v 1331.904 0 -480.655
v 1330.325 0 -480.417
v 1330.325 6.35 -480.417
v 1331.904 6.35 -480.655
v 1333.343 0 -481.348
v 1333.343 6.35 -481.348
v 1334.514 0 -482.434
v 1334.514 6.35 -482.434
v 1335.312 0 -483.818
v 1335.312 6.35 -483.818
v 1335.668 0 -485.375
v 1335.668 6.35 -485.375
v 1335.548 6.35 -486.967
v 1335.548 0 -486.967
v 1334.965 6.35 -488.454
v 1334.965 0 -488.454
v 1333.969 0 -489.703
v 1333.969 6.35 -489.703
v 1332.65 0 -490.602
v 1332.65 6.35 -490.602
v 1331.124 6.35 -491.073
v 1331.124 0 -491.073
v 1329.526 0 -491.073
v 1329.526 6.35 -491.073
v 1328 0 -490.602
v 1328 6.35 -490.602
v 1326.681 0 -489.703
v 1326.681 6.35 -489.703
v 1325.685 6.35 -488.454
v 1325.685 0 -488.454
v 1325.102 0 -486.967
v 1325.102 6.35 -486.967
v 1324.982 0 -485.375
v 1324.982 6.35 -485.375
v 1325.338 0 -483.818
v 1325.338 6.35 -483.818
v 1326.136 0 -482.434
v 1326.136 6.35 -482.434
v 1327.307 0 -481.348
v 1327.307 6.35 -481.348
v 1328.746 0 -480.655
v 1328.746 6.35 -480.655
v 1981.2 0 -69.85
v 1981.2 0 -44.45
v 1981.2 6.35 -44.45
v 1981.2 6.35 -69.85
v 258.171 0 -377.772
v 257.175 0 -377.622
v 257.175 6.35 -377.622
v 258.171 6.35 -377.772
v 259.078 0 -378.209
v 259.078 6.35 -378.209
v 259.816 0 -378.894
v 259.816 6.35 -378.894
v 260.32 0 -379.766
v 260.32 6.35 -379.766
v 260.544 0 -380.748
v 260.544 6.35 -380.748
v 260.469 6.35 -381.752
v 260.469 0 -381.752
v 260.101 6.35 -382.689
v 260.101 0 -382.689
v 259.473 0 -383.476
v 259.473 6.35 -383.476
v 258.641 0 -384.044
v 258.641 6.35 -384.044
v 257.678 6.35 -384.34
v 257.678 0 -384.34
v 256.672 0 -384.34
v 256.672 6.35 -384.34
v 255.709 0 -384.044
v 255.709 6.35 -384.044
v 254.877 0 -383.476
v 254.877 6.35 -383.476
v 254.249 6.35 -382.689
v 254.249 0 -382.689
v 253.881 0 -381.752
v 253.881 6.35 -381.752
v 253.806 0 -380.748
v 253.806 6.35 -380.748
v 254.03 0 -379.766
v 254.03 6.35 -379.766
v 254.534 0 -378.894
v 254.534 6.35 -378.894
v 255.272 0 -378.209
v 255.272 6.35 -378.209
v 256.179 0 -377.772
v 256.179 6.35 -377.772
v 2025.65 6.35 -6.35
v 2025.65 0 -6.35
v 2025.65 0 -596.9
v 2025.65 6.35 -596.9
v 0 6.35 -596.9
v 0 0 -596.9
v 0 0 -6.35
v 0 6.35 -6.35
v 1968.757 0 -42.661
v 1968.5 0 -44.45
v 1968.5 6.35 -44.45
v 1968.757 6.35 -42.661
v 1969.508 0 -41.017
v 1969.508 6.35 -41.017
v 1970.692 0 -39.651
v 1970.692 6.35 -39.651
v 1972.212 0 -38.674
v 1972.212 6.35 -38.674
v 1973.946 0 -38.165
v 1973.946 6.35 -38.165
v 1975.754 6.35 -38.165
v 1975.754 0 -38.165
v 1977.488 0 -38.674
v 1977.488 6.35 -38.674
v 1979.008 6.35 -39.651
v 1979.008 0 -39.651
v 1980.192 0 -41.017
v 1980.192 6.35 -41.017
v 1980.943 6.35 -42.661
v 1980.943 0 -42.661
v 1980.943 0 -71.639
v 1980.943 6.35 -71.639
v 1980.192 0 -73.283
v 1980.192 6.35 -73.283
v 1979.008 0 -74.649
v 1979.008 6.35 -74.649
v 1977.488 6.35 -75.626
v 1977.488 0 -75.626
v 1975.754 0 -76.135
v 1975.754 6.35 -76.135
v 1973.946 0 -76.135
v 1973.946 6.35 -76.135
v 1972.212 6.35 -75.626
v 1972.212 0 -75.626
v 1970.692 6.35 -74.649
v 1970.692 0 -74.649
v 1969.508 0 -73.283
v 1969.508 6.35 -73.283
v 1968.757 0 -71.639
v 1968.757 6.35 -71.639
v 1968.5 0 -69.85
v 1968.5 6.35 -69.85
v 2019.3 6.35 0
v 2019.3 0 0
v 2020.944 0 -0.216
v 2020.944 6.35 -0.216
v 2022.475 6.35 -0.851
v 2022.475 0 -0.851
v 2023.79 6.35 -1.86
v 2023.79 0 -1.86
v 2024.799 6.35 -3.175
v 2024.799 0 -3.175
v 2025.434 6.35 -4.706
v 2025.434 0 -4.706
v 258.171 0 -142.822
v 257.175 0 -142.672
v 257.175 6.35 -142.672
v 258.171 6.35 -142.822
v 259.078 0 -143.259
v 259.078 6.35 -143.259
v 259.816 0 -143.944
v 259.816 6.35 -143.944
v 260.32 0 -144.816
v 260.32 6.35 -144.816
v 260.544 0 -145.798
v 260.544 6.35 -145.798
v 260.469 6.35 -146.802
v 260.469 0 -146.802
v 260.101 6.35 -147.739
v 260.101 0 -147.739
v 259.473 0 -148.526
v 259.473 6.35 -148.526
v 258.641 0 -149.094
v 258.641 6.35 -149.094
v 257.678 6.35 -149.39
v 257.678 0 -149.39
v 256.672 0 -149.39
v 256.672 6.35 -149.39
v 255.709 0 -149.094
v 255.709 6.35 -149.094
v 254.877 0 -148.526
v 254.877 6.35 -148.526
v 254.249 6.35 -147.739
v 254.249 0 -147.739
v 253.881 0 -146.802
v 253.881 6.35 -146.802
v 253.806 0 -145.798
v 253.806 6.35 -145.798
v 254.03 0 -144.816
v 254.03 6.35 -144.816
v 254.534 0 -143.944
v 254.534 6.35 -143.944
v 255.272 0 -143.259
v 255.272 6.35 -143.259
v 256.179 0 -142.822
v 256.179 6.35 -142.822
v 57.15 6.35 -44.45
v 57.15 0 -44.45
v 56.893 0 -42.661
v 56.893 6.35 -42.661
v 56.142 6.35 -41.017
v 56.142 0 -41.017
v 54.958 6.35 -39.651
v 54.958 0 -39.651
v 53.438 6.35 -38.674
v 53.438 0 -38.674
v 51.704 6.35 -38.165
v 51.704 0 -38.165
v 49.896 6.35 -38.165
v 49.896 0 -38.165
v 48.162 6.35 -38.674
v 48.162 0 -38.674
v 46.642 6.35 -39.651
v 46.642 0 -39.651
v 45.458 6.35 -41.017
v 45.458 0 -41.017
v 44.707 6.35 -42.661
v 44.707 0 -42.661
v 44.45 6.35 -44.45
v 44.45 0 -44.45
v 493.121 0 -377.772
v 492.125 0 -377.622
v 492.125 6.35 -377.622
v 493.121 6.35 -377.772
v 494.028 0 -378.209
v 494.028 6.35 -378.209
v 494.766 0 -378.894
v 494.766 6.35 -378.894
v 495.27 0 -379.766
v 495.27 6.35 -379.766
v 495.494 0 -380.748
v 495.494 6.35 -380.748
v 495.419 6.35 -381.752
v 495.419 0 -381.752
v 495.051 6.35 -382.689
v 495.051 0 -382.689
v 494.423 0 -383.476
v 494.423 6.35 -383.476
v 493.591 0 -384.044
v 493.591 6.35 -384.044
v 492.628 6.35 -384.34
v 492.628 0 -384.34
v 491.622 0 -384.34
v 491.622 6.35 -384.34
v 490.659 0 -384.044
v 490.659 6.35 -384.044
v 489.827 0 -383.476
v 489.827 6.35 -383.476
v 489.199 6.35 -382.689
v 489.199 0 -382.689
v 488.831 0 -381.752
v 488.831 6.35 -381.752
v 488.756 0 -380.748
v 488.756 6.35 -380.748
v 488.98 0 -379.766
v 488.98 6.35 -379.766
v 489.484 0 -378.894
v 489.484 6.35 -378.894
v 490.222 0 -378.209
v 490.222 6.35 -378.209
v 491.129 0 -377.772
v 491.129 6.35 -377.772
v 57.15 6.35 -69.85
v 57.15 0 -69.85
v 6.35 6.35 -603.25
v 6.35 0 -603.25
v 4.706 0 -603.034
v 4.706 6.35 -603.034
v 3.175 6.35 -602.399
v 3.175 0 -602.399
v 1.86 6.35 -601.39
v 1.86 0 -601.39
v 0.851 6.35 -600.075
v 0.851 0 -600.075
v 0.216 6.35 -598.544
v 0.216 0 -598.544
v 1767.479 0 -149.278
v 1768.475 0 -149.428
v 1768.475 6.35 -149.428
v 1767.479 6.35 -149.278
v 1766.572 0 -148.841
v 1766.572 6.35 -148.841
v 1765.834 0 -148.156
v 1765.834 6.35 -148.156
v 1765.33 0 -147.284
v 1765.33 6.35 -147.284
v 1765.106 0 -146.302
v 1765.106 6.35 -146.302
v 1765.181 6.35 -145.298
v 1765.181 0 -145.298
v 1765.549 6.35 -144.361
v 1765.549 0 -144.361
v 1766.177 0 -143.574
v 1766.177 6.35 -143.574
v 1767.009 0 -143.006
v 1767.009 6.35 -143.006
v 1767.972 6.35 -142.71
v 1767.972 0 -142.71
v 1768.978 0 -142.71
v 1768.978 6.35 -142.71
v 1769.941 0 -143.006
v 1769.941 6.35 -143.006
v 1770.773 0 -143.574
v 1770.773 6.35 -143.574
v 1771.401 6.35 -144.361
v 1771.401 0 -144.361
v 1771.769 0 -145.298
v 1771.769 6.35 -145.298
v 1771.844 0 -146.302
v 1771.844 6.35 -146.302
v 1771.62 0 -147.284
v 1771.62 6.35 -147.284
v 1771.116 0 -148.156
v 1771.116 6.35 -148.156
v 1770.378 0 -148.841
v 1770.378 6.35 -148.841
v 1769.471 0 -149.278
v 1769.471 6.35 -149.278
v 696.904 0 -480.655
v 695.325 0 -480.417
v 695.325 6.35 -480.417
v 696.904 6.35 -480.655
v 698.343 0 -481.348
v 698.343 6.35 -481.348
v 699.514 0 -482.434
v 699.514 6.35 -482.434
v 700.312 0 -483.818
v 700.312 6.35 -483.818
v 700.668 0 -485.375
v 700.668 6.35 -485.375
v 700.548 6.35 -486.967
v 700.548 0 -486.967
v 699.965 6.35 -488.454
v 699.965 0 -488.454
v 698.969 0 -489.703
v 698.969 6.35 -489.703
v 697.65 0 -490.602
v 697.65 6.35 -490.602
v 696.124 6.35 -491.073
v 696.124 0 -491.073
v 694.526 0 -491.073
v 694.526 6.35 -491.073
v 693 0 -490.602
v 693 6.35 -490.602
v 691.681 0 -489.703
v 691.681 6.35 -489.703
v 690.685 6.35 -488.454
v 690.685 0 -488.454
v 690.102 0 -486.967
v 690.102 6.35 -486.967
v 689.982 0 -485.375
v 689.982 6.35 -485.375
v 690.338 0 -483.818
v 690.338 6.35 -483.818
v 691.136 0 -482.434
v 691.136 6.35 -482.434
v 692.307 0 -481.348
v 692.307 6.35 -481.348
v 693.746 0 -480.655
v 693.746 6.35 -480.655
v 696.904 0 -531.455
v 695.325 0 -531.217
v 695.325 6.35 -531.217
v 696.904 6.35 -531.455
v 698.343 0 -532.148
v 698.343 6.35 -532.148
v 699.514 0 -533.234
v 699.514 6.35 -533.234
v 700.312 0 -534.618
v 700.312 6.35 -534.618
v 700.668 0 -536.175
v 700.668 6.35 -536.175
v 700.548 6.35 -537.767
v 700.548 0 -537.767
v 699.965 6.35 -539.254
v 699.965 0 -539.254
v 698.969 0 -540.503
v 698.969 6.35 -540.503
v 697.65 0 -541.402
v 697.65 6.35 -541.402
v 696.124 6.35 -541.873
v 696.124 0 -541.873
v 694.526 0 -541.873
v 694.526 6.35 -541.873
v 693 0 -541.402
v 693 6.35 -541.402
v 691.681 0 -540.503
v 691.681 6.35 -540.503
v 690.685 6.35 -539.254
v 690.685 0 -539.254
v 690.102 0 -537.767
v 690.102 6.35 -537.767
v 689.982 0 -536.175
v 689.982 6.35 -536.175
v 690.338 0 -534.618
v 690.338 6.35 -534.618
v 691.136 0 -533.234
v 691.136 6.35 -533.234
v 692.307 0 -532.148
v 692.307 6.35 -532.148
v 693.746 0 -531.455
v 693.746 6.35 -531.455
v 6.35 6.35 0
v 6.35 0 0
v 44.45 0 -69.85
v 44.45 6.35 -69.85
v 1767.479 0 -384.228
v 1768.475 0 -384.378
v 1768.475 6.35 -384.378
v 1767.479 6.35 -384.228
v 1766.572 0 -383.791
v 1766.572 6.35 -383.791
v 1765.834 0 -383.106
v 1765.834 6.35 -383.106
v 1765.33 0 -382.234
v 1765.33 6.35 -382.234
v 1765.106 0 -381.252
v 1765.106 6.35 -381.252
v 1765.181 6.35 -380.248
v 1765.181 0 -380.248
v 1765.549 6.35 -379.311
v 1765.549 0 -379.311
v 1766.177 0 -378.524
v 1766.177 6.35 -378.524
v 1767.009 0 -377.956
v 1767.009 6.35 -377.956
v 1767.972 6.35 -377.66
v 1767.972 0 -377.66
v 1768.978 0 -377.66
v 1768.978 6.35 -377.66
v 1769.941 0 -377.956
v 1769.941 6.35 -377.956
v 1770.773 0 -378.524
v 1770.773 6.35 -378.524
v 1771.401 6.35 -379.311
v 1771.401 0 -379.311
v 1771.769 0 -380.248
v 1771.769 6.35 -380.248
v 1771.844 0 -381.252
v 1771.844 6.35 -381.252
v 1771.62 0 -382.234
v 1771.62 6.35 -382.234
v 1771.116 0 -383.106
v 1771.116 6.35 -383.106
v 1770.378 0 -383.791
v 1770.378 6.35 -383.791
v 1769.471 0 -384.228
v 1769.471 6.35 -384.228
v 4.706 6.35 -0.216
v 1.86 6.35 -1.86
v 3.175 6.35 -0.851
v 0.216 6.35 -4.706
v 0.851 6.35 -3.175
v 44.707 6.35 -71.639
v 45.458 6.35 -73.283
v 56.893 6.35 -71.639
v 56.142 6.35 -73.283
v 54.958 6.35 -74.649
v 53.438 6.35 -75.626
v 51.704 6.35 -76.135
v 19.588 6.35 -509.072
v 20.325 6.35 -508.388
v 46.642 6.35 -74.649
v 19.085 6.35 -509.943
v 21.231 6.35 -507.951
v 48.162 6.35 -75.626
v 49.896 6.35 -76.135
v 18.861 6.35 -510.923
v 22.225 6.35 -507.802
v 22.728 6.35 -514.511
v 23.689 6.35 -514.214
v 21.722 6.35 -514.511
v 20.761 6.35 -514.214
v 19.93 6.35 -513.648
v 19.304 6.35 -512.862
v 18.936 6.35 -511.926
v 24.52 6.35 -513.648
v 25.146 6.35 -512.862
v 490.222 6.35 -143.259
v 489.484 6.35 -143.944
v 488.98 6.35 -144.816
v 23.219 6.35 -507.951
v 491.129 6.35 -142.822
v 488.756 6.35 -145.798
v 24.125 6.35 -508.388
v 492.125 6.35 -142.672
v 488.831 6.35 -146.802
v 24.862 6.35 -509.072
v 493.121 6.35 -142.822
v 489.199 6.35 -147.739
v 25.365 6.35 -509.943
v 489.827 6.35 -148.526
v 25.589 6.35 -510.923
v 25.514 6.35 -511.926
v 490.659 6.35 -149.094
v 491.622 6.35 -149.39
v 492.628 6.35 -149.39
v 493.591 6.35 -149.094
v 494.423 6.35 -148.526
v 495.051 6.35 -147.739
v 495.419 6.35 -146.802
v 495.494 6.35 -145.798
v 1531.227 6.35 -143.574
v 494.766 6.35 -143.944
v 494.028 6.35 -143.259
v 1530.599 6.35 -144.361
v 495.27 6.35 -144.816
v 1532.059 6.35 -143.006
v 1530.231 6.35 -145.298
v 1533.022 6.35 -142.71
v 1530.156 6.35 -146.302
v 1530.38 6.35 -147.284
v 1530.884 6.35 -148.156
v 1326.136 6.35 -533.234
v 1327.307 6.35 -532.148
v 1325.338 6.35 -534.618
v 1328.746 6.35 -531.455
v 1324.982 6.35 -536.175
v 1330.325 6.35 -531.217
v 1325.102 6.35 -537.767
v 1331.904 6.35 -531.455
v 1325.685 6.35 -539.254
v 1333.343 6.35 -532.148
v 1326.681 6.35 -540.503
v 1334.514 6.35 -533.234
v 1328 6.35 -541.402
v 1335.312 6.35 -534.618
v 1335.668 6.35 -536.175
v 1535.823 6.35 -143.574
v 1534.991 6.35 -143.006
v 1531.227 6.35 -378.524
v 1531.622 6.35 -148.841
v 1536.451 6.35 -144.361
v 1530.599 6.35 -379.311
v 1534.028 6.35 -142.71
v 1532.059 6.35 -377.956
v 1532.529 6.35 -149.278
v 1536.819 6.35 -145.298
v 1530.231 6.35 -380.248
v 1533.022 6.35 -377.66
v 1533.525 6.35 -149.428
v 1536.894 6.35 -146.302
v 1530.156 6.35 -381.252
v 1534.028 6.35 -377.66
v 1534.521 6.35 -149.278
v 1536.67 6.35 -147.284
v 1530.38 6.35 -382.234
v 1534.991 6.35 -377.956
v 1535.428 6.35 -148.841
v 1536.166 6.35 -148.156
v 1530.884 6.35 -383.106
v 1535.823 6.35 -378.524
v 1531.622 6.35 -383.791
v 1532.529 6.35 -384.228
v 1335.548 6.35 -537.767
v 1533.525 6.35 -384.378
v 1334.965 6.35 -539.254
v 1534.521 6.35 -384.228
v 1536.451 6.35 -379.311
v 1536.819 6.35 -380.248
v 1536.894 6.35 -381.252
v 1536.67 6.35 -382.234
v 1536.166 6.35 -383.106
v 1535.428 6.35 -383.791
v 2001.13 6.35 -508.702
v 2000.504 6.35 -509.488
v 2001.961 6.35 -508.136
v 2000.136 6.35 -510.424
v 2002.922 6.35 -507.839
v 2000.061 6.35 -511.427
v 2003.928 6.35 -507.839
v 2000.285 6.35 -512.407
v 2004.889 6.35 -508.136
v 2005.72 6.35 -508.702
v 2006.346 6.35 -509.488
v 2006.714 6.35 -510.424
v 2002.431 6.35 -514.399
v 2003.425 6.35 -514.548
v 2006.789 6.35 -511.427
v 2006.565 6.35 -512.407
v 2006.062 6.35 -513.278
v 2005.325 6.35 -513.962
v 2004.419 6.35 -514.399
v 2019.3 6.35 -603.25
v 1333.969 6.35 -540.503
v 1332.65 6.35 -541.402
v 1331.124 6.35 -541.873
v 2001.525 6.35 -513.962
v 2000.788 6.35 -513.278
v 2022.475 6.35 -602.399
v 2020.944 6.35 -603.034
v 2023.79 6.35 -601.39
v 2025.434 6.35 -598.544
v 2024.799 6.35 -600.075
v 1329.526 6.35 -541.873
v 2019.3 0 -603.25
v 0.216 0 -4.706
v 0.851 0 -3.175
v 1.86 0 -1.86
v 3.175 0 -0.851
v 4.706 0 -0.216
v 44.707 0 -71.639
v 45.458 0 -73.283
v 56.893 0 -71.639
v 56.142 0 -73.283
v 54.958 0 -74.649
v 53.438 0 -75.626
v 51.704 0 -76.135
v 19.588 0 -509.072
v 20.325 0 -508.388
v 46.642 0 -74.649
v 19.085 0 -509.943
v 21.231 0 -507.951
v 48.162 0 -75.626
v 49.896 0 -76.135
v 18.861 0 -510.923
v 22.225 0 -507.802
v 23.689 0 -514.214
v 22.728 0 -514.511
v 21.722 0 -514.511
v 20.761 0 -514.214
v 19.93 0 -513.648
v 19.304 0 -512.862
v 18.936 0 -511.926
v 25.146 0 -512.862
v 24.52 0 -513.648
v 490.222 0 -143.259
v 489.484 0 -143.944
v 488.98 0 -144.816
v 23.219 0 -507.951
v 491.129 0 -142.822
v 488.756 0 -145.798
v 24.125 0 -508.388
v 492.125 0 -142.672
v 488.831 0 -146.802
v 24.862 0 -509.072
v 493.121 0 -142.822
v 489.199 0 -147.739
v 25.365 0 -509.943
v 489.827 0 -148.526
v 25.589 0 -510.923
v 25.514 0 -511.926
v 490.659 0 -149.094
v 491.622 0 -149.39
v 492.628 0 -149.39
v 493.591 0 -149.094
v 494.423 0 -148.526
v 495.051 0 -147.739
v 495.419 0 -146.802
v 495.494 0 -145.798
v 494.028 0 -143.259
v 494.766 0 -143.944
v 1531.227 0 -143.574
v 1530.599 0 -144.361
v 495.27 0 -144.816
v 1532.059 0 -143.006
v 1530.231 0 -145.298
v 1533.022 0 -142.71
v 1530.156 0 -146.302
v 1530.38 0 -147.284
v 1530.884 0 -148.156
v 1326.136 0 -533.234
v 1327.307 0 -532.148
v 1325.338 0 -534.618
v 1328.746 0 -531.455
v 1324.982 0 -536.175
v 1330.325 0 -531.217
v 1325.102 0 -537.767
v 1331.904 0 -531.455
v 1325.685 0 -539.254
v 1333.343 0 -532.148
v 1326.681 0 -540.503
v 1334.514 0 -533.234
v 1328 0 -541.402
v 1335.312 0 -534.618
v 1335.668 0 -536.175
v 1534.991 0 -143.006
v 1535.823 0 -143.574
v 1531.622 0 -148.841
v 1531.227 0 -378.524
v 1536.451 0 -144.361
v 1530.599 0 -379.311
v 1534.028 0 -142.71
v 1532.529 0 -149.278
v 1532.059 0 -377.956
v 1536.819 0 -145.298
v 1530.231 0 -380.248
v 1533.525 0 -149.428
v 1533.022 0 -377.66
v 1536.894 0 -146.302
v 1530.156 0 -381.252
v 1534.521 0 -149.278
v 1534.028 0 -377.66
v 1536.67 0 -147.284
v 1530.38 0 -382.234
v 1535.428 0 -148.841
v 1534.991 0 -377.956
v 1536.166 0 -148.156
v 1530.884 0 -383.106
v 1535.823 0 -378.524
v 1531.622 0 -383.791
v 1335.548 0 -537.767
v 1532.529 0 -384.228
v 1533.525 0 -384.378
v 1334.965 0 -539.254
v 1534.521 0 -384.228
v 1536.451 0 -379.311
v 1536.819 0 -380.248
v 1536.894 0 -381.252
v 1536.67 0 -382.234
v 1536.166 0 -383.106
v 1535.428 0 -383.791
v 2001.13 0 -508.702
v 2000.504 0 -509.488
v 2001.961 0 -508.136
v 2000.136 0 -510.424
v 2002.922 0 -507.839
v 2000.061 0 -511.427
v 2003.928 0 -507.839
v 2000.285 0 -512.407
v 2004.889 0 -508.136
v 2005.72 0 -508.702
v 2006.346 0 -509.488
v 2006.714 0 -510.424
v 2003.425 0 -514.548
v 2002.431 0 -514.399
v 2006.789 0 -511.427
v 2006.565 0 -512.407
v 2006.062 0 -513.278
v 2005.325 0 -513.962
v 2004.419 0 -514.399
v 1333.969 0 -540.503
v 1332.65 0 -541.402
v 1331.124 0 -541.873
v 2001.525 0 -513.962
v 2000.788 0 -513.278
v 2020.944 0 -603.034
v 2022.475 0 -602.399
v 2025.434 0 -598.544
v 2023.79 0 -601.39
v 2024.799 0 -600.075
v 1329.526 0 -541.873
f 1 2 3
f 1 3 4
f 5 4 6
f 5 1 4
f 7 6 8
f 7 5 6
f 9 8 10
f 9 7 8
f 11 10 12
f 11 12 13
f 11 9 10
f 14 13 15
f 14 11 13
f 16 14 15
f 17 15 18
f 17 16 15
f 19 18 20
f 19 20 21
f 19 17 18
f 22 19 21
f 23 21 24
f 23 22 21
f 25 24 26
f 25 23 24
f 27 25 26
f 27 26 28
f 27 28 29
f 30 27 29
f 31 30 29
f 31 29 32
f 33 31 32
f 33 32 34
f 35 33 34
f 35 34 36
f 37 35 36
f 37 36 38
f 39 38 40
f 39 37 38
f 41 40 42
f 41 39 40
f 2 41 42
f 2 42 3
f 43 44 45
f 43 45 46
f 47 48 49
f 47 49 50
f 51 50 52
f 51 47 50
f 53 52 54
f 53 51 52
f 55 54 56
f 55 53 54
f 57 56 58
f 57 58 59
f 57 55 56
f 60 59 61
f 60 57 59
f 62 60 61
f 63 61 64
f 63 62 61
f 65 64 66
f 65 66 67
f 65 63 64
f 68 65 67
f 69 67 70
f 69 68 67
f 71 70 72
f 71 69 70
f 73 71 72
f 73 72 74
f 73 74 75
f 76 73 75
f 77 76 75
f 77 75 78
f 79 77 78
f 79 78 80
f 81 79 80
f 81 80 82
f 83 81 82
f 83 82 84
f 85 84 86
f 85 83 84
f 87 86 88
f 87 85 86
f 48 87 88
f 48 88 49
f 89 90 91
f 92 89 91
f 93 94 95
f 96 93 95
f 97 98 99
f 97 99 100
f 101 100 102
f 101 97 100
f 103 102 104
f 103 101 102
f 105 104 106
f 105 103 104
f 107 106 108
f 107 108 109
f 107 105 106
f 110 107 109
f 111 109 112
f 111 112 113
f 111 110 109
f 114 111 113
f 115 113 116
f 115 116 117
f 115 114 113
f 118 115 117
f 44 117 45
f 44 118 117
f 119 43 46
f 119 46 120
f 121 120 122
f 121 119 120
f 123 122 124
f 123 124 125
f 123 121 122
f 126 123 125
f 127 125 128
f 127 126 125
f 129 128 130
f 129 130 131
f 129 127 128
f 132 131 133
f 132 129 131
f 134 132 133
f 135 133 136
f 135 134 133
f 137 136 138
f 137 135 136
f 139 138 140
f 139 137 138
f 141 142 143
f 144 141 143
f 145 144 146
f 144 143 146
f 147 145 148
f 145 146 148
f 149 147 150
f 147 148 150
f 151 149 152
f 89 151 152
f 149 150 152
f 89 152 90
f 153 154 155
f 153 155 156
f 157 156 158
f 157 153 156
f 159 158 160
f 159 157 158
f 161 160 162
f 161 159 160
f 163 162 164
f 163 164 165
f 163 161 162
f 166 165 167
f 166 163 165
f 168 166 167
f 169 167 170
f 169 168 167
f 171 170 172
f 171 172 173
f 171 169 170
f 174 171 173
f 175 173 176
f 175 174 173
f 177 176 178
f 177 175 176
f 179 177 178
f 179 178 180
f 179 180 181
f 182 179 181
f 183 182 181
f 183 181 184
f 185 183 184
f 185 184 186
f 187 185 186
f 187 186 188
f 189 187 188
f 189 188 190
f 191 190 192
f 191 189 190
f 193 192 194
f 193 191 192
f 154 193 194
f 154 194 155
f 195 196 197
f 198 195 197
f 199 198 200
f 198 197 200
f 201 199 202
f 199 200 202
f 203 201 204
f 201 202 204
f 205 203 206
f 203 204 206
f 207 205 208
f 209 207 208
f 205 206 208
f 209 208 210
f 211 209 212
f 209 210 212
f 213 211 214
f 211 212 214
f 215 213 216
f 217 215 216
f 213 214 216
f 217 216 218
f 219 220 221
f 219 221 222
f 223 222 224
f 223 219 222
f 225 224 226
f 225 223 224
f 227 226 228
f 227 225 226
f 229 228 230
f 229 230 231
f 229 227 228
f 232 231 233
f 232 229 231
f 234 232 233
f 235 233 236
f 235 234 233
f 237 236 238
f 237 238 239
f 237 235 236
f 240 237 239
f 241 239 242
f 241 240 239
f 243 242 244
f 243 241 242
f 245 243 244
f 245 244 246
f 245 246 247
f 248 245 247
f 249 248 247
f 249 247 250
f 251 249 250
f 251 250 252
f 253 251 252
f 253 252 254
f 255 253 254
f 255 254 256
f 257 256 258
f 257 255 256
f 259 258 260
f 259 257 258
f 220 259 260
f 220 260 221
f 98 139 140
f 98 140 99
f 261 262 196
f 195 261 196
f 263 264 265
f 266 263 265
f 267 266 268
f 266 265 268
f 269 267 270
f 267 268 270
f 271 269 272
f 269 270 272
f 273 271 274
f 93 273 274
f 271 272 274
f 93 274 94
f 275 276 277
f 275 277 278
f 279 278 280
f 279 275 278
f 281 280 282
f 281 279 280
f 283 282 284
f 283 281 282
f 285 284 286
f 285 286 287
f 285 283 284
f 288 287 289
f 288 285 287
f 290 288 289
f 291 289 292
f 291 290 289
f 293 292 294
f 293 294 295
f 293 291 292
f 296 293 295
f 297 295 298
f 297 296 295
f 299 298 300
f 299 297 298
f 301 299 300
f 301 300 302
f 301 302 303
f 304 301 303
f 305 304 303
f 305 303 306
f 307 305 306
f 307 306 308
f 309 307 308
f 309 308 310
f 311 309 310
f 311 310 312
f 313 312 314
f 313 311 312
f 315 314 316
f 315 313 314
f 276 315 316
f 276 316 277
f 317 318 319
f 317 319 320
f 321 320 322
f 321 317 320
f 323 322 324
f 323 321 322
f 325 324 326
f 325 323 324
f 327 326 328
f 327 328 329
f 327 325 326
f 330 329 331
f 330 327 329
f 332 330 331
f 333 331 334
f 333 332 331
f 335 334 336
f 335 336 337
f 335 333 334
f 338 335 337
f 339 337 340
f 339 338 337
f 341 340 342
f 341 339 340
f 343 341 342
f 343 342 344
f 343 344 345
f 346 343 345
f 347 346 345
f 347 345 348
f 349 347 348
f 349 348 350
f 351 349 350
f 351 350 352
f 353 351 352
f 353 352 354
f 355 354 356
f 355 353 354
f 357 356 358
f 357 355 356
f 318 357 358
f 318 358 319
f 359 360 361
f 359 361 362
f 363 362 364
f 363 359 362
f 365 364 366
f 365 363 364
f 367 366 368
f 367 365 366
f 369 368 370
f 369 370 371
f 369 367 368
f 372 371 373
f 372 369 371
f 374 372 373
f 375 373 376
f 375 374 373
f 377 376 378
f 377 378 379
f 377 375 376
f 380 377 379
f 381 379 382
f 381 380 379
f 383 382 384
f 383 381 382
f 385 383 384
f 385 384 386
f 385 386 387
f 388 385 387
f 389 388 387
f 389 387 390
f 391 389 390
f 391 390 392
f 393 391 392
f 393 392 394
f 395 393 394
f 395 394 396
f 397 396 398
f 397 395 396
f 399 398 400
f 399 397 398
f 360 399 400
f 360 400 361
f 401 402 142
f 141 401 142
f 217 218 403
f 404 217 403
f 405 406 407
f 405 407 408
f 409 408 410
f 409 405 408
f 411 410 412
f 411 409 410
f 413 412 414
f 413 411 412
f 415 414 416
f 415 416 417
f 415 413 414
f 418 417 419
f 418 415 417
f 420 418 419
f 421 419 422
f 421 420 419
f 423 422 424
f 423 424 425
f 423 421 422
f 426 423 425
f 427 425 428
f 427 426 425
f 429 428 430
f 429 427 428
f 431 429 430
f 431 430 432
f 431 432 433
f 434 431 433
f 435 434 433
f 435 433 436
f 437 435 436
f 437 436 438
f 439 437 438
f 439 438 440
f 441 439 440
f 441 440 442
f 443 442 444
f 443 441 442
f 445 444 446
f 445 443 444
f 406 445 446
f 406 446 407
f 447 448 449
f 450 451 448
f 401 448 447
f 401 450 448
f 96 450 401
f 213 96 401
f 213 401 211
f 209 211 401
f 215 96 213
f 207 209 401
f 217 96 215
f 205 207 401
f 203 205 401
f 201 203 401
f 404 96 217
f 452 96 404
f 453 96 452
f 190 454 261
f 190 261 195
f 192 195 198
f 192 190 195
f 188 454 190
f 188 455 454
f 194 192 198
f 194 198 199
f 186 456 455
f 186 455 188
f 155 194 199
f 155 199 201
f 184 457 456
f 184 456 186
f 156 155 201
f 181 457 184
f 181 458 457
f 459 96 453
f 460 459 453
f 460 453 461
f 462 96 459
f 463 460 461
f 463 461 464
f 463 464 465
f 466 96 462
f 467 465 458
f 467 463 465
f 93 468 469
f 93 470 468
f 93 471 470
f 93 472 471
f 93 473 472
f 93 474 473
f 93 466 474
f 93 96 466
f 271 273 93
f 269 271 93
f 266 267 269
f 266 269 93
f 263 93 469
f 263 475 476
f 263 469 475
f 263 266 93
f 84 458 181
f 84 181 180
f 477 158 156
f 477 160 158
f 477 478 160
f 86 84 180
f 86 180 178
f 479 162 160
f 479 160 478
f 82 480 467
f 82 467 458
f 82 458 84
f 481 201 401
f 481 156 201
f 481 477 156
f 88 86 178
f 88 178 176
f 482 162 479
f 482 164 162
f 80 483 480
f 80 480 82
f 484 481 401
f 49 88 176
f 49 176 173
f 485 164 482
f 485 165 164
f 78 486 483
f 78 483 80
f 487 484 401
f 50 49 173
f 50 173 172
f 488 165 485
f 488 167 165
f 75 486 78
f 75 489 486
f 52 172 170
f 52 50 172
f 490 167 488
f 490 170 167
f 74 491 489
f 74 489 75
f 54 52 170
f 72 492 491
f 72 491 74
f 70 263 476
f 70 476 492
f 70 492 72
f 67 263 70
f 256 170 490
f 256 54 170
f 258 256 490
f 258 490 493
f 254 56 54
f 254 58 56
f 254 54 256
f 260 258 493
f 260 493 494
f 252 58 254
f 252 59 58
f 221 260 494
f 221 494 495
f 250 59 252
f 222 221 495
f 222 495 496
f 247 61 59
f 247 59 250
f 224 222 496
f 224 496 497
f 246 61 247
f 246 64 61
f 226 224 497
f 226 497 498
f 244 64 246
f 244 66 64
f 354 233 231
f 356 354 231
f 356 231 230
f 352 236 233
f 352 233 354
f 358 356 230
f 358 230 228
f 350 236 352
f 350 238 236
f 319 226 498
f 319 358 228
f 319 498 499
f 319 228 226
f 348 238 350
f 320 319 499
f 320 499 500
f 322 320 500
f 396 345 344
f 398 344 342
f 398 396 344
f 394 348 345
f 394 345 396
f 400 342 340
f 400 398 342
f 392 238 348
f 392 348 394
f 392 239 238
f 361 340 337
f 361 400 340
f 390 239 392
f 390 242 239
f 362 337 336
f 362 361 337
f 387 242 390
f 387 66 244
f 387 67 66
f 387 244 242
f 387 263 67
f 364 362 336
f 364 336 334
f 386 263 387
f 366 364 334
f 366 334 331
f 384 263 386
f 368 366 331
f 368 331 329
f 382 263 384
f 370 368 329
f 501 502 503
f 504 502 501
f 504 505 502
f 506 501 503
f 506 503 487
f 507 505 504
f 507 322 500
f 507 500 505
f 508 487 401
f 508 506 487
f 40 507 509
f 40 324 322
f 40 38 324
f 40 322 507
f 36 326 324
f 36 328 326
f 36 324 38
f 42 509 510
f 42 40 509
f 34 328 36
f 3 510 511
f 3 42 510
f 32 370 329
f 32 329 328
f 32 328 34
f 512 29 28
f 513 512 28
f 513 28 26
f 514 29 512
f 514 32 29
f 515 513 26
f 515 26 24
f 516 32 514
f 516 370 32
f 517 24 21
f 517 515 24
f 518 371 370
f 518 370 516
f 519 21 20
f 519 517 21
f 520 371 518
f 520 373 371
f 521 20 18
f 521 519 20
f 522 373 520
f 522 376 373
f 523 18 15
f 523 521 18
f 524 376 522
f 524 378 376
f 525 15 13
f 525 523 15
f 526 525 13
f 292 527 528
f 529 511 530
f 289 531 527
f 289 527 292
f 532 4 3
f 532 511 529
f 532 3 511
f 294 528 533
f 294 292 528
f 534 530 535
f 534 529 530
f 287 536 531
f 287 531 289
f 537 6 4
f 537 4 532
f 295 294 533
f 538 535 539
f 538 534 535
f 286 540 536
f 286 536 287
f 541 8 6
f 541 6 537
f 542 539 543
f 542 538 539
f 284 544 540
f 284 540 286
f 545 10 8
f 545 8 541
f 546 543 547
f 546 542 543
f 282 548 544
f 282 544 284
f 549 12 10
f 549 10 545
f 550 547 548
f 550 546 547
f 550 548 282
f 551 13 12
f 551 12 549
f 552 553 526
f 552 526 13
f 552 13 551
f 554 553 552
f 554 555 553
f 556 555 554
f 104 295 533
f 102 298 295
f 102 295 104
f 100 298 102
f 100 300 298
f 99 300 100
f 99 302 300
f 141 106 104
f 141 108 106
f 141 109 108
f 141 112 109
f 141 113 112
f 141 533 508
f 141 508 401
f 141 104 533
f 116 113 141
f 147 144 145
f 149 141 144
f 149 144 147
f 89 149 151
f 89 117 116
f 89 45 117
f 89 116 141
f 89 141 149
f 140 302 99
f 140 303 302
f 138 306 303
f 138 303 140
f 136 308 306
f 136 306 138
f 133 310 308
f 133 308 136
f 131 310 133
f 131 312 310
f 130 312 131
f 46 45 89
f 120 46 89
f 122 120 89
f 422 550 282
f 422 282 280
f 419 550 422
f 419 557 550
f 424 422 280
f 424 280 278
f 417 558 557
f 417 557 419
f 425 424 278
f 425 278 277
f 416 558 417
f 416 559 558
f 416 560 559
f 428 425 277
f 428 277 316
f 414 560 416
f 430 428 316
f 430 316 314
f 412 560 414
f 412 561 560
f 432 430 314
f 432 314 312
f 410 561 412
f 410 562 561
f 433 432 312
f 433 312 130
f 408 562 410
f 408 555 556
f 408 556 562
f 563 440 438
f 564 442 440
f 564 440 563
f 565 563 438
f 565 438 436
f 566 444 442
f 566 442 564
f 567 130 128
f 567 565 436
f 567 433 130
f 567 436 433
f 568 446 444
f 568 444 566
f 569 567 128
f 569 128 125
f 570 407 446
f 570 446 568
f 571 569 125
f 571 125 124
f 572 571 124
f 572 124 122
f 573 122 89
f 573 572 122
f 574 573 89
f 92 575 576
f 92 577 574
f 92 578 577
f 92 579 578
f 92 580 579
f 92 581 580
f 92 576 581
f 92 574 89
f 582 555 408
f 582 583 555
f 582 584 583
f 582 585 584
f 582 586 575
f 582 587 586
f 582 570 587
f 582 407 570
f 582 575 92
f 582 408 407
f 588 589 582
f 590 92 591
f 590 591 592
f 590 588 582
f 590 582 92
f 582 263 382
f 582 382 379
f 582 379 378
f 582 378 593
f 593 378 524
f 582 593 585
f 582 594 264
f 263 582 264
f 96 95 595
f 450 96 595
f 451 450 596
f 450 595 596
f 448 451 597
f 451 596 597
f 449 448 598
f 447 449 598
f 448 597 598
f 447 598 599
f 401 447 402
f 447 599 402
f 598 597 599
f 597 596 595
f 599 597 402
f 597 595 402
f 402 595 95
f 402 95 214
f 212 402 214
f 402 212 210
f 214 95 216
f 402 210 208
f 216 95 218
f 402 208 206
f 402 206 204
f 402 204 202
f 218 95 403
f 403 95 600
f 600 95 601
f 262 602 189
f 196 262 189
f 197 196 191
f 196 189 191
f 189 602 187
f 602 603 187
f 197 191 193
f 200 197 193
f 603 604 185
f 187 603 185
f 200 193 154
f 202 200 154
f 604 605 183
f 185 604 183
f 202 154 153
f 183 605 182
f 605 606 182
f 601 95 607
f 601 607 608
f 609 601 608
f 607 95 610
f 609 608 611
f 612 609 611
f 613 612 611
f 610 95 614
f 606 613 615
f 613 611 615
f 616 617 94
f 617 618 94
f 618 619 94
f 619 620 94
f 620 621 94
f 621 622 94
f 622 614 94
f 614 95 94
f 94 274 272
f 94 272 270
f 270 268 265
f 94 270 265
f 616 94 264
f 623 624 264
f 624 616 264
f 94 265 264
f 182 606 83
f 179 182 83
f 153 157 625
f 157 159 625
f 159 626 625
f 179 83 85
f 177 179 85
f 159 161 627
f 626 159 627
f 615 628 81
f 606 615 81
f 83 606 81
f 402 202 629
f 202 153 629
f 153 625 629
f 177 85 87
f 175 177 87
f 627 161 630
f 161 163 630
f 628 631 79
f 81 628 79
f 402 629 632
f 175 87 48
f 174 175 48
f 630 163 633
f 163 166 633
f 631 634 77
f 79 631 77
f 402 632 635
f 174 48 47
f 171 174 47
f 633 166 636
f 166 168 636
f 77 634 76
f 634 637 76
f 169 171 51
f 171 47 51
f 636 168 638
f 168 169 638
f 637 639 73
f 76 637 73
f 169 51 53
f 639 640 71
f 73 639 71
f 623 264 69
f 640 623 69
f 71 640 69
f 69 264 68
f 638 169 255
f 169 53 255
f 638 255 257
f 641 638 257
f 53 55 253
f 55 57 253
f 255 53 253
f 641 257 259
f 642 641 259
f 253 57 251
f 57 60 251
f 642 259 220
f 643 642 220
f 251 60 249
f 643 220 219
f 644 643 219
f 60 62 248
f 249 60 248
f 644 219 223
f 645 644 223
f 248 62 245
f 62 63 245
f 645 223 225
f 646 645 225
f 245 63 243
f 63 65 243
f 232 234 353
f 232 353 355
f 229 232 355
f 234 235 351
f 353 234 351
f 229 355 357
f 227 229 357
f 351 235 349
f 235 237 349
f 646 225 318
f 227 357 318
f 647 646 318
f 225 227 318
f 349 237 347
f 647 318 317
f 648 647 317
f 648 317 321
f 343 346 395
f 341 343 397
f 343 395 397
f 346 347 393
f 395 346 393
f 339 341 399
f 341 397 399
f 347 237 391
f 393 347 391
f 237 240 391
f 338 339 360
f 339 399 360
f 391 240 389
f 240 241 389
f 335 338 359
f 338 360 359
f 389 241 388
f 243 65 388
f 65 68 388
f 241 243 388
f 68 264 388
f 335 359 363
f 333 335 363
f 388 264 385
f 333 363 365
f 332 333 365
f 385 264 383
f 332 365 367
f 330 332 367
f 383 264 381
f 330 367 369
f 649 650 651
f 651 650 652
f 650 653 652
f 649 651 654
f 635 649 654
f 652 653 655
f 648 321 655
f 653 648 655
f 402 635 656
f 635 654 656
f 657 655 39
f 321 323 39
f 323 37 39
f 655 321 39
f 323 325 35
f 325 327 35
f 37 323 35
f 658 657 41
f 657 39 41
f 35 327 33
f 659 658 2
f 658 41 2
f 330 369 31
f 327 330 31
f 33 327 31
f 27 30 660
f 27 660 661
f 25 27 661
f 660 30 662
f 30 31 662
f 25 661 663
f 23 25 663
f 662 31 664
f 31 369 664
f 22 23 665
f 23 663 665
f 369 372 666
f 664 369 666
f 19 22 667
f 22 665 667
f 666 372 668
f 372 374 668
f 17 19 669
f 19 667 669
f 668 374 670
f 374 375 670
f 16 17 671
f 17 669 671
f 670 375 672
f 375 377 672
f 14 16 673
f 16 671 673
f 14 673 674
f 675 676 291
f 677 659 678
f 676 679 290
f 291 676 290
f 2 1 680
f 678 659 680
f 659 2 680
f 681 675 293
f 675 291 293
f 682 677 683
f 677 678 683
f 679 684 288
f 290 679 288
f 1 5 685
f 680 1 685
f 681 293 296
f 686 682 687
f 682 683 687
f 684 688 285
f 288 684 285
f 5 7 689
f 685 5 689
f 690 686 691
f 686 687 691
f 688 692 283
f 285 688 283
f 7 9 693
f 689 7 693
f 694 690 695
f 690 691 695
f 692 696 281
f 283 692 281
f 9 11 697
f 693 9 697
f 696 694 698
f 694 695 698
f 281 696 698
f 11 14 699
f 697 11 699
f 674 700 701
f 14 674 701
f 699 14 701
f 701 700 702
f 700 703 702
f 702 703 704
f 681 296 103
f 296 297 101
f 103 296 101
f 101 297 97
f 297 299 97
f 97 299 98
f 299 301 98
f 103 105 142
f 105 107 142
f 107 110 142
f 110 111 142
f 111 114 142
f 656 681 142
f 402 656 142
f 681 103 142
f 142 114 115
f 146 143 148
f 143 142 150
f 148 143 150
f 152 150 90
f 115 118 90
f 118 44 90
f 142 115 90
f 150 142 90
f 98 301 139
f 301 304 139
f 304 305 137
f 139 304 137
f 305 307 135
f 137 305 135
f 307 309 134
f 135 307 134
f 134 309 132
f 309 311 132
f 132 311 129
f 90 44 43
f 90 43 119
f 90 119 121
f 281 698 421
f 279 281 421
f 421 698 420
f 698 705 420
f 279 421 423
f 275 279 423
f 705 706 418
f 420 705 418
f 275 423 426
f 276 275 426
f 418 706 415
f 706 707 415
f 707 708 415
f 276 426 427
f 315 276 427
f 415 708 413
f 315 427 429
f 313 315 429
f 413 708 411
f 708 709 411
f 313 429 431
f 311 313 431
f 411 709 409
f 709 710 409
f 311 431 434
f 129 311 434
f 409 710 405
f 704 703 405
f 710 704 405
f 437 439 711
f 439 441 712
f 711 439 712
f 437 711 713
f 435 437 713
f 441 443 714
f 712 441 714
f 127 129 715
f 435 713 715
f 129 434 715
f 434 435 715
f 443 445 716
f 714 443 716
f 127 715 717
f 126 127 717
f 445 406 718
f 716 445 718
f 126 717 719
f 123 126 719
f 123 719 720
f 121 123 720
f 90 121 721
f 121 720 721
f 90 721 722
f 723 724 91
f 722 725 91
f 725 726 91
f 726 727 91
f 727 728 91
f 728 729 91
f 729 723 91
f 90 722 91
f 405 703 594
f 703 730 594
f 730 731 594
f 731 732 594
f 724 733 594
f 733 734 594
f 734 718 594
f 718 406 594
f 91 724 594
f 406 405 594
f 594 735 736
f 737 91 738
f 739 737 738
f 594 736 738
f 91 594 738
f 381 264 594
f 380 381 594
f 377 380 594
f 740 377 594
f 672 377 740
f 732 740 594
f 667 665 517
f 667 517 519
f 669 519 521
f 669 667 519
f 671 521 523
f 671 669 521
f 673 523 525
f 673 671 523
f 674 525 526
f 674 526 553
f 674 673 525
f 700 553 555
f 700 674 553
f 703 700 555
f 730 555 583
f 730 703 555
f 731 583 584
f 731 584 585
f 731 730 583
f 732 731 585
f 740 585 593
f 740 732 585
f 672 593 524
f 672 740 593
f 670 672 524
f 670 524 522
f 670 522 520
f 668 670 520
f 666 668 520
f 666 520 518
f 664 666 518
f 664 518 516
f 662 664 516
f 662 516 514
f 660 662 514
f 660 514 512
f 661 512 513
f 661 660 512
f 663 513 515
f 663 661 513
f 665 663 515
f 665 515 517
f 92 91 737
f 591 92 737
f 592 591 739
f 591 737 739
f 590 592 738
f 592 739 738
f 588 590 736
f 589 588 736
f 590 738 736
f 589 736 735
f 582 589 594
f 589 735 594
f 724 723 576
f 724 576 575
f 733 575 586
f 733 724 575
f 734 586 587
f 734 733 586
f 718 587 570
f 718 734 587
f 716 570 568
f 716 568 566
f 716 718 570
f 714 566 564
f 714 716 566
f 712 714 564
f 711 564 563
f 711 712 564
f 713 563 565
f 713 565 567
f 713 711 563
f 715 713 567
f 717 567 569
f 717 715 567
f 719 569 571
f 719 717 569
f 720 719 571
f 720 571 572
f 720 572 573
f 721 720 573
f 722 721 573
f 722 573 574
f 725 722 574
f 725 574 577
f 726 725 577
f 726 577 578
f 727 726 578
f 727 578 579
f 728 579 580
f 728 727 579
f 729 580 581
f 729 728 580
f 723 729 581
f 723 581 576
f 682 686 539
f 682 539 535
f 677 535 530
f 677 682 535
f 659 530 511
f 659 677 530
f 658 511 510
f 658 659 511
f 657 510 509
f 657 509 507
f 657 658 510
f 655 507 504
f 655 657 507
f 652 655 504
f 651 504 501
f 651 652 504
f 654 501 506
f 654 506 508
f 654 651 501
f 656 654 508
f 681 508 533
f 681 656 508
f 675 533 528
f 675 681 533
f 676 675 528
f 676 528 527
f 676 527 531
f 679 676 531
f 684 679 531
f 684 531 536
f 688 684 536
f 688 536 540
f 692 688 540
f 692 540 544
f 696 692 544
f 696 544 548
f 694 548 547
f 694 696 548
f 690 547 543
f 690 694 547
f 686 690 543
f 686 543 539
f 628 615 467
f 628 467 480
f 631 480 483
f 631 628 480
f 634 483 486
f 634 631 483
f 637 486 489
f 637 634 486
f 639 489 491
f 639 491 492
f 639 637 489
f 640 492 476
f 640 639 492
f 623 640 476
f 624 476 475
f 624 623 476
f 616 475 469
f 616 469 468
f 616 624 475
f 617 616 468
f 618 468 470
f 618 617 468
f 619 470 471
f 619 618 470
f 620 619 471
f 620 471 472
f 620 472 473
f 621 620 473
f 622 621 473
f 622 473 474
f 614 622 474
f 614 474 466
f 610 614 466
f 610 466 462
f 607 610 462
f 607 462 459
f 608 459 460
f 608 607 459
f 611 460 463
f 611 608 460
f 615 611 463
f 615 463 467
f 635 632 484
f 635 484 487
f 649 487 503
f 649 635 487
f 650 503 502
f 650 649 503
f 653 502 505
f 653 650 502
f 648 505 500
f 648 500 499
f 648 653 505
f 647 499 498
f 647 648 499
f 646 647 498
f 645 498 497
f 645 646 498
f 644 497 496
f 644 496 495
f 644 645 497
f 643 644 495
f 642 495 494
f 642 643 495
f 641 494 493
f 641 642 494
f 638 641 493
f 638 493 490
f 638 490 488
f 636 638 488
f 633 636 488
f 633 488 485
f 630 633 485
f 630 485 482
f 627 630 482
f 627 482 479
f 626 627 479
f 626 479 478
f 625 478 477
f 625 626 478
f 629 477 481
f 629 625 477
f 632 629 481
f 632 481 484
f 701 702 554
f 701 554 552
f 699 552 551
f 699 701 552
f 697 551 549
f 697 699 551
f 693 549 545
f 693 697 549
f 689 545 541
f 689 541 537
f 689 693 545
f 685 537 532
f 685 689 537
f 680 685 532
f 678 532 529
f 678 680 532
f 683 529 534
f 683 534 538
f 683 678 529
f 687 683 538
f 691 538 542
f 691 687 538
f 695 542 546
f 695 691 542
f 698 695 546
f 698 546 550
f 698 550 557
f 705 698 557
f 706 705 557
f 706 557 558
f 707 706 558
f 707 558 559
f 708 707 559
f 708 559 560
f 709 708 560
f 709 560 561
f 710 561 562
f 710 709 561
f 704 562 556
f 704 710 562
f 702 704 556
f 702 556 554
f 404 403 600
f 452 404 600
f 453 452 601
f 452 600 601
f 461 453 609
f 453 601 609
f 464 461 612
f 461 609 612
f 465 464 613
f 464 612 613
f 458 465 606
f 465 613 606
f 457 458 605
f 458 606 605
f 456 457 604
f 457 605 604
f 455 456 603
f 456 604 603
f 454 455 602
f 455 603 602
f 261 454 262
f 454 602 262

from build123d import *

# Parameters (mm, degrees)
SKETCH1_R           = 5.3578125
SKETCH1_R_2         = 3.3782
SKETCH1_R_3         = 3.3734375
BOSS_EXTRUDE1_DEPTH = 6.35


with BuildPart() as part:
    # Sketch1 → Boss-Extrude1 (new body)
    with BuildSketch(Plane(origin=(0, 0, 0), x_dir=(1, 0, 0), z_dir=(0, 1, 0))):
        with BuildLine():
            Line((6.35, 0), (2019.3, 0))
            ThreePointArc((2019.3, 0), (2023.790128061, 1.859871939), (2025.65, 6.35))
            Line((2025.65, 6.35), (2025.65, 596.9))
            ThreePointArc((2025.65, 596.9), (2023.790128061, 601.390128061), (2019.3, 603.25))
            Line((2019.3, 603.25), (6.35, 603.25))
            ThreePointArc((6.35, 603.25), (1.859871939, 601.390128061), (0, 596.9))
            Line((0, 596.9), (0, 6.35))
            ThreePointArc((0, 6.35), (1.859871939, 1.859871939), (6.35, 0))
        make_face()
        with Locations(Location((695.325, 485.775, 0), (0, 0, 270))):
            Circle(SKETCH1_R, mode=Mode.SUBTRACT)
        with Locations(Location((1330.325, 485.775, 0), (0, 0, 270))):
            Circle(SKETCH1_R, mode=Mode.SUBTRACT)
        with Locations(Location((257.175, 381, 0), (0, 0, 270))):
            Circle(SKETCH1_R_2, mode=Mode.SUBTRACT)
        with Locations(Location((492.125, 381, 0), (0, 0, 270))):
            Circle(SKETCH1_R_2, mode=Mode.SUBTRACT)
        with Locations(Location((492.125, 146.05, 0), (0, 0, 270))):
            Circle(SKETCH1_R_2, mode=Mode.SUBTRACT)
        with Locations(Location((257.175, 146.05, 0), (0, 0, 270))):
            Circle(SKETCH1_R_2, mode=Mode.SUBTRACT)
        with Locations(Location((695.325, 536.575, 0), (0, 0, 270))):
            Circle(SKETCH1_R, mode=Mode.SUBTRACT)
        with Locations(Location((1768.475, 146.05, 0), (0, 0, 90))):
            Circle(SKETCH1_R_2, mode=Mode.SUBTRACT)
        with Locations(Location((1533.525, 146.05, 0), (0, 0, 90))):
            Circle(SKETCH1_R_2, mode=Mode.SUBTRACT)
        with Locations(Location((1533.525, 381, 0), (0, 0, 90))):
            Circle(SKETCH1_R_2, mode=Mode.SUBTRACT)
        with Locations(Location((1768.475, 381, 0), (0, 0, 90))):
            Circle(SKETCH1_R_2, mode=Mode.SUBTRACT)
        with Locations(Location((22.225, 511.175, 0), (0, 0, 270))):
            Circle(SKETCH1_R_3, mode=Mode.SUBTRACT)
        with Locations(Location((2003.425, 511.175, 0), (0, 0, 90))):
            Circle(SKETCH1_R_3, mode=Mode.SUBTRACT)
        with Locations(Location((1330.325, 536.575, 0), (0, 0, 270))):
            Circle(SKETCH1_R, mode=Mode.SUBTRACT)
        with BuildLine():
            Line((57.15, 69.85), (57.15, 44.45))
            ThreePointArc((57.15, 44.45), (50.8, 38.1), (44.45, 44.45))
            Line((44.45, 44.45), (44.45, 69.85))
            ThreePointArc((44.45, 69.85), (50.8, 76.2), (57.15, 69.85))
        make_face(mode=Mode.SUBTRACT)
        with BuildLine():
            Line((1968.5, 69.85), (1968.5, 44.45))
            ThreePointArc((1968.5, 44.45), (1974.85, 38.1), (1981.2, 44.45))
            Line((1981.2, 44.45), (1981.2, 69.85))
            ThreePointArc((1981.2, 69.85), (1974.85, 76.2), (1968.5, 69.85))
        make_face(mode=Mode.SUBTRACT)
    extrude(amount=BOSS_EXTRUDE1_DEPTH)


solid = part.part
